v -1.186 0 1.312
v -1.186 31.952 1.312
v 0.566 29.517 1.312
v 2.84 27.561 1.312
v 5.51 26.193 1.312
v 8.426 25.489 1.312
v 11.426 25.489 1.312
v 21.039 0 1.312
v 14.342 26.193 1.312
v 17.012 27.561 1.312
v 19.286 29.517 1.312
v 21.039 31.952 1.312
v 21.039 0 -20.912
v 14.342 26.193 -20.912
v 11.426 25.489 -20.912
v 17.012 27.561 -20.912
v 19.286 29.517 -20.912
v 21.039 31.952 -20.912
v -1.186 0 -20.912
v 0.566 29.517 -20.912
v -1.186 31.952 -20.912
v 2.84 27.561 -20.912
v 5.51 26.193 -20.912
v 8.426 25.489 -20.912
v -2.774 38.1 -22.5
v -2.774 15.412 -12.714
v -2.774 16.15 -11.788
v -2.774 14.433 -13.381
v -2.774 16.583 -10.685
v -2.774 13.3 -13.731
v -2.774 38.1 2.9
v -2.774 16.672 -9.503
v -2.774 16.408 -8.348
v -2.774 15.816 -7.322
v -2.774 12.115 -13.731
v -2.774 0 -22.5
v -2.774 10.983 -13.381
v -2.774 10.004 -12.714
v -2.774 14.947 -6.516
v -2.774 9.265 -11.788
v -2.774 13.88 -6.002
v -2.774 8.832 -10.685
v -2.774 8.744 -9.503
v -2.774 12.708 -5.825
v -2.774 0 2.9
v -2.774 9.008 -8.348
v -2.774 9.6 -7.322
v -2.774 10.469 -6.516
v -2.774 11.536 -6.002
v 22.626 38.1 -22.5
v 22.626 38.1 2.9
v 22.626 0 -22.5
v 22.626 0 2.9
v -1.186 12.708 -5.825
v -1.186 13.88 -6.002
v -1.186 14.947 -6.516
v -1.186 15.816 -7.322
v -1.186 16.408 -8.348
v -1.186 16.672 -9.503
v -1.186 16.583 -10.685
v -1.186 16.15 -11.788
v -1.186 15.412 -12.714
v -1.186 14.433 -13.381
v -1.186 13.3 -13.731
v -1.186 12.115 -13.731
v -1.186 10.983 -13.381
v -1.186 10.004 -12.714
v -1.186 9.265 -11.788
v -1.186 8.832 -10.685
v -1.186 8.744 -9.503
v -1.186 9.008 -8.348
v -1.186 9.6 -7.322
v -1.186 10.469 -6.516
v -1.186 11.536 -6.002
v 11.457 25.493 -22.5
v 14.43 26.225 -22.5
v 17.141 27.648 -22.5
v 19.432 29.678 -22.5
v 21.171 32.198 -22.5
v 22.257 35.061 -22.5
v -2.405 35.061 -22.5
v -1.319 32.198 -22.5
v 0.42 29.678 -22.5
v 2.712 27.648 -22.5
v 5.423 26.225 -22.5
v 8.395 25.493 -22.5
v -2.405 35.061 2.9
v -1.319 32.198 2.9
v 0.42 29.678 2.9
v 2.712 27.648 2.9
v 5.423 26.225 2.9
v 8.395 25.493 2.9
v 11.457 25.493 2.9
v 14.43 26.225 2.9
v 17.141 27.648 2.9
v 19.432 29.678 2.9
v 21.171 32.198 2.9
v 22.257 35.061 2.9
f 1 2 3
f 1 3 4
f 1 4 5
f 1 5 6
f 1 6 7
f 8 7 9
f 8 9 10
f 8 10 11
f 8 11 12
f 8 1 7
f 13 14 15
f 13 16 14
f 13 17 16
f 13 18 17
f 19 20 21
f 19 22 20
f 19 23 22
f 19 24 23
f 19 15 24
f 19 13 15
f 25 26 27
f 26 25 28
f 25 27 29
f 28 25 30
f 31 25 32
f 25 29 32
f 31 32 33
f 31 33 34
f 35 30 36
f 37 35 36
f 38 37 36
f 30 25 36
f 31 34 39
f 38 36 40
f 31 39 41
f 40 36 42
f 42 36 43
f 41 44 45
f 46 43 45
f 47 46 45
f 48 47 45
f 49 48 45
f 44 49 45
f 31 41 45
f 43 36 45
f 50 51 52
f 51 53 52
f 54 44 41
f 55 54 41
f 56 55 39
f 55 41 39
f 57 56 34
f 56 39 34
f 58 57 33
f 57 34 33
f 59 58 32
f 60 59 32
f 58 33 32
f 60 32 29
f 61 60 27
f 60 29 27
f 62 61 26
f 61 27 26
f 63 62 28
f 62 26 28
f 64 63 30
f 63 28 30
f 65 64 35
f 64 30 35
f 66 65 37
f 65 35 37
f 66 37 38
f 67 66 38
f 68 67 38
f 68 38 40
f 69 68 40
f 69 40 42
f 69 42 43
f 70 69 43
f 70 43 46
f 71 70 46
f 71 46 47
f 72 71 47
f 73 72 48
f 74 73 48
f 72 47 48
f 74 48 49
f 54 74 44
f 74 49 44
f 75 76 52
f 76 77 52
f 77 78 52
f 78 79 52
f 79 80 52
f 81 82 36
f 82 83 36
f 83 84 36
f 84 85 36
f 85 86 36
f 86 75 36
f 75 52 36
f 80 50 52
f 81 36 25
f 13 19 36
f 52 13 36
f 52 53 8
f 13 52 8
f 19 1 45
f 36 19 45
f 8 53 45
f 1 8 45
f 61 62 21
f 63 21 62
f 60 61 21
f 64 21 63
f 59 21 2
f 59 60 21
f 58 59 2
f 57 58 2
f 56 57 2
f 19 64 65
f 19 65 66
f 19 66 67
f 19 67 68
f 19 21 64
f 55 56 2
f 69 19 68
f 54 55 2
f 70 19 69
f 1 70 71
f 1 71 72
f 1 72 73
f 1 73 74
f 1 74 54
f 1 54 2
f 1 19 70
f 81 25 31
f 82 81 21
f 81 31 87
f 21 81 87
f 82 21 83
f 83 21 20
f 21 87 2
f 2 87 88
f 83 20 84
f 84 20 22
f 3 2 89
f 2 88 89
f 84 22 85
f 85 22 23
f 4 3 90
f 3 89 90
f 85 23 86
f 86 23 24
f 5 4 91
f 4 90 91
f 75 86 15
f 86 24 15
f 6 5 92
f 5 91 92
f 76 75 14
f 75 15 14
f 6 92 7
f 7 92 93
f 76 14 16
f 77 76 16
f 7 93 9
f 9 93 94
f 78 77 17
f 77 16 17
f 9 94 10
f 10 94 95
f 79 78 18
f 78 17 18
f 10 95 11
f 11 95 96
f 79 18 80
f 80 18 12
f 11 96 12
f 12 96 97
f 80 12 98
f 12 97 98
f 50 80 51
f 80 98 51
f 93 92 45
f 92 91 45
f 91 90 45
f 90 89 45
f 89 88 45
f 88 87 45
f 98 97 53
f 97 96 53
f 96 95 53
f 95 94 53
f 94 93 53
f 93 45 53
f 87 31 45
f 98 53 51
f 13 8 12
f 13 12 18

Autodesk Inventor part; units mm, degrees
ref_plane "YZ Plane" through (0, 0, 0) normal (1, 0, 0) x (0, 1, 0)
ref_plane "XZ Plane" through (0, 0, 0) normal (0, 1, 0) x (-1, 0, 0)
ref_plane "XY Plane" through (0, 0, 0) normal (0, 0, 1) x (1, 0, 0)
sketch "Sketch3" plane through (0, 0, 0) normal (0, 1, 0) x (-1, 0, 0)
  line L0 (2.7739, 2.9) -> (-22.6261, 2.9)
  line L1 (-22.6261, 2.9) -> (-22.6261, -22.5)
  line L2 (-22.6261, -22.5) -> (2.7739, -22.5)
  line L3 (2.7739, -22.5) -> (2.7739, 2.9)
  line L4 (-22.6261, 2.9) -> (-21.0386, 2.9)
  line L5 (-21.0386, -20.9125) -> (1.1864, -20.9125)
  line L6 (1.1864, -20.9125) -> (1.1864, 1.3125)
  line L7 (1.1864, 1.3125) -> (-21.0386, 1.3125)
  line L8 (-21.0386, 1.3125) -> (-21.0386, -20.9125)
  point P0 (0, 0)
  dimension "d4" = 25.4
  dimension "d5" = 25.4
  dimension "d6" = 1.5875
  dimension "d7" = 23.8125
  dimension "d8" = 22.225
  dimension "d9" = 22.225
extrude "Extrusion2" add sketch "Sketch3" along normal blind 38.1
sketch "Sketch5" plane through (-2.7739, 0, 2.9) normal (0, 0, 1) x (1, 0, 0)
  line L0 (0, 38.1) -> (25.4, 38.1) projected
  circle A0 centre (12.7, 38.1) radius 12.7
  point P0 (2.7739, 0)
extrude "Extrusion4" cut sketch "Sketch5" against normal blind 25.4
sketch "Sketch8" plane through (-2.7739, 0, -22.5) normal (-1, 0, 0) x (0, 0, 1)
  circle A0 centre (12.7, 12.7079) radius 3.9751
  point P0 (22.5, 0)
  dimension "d22" = 7.9502
extrude "Extrusion6" cut sketch "Sketch8" against normal blind 12.7
properties part number "Seat tab to frame mount"
